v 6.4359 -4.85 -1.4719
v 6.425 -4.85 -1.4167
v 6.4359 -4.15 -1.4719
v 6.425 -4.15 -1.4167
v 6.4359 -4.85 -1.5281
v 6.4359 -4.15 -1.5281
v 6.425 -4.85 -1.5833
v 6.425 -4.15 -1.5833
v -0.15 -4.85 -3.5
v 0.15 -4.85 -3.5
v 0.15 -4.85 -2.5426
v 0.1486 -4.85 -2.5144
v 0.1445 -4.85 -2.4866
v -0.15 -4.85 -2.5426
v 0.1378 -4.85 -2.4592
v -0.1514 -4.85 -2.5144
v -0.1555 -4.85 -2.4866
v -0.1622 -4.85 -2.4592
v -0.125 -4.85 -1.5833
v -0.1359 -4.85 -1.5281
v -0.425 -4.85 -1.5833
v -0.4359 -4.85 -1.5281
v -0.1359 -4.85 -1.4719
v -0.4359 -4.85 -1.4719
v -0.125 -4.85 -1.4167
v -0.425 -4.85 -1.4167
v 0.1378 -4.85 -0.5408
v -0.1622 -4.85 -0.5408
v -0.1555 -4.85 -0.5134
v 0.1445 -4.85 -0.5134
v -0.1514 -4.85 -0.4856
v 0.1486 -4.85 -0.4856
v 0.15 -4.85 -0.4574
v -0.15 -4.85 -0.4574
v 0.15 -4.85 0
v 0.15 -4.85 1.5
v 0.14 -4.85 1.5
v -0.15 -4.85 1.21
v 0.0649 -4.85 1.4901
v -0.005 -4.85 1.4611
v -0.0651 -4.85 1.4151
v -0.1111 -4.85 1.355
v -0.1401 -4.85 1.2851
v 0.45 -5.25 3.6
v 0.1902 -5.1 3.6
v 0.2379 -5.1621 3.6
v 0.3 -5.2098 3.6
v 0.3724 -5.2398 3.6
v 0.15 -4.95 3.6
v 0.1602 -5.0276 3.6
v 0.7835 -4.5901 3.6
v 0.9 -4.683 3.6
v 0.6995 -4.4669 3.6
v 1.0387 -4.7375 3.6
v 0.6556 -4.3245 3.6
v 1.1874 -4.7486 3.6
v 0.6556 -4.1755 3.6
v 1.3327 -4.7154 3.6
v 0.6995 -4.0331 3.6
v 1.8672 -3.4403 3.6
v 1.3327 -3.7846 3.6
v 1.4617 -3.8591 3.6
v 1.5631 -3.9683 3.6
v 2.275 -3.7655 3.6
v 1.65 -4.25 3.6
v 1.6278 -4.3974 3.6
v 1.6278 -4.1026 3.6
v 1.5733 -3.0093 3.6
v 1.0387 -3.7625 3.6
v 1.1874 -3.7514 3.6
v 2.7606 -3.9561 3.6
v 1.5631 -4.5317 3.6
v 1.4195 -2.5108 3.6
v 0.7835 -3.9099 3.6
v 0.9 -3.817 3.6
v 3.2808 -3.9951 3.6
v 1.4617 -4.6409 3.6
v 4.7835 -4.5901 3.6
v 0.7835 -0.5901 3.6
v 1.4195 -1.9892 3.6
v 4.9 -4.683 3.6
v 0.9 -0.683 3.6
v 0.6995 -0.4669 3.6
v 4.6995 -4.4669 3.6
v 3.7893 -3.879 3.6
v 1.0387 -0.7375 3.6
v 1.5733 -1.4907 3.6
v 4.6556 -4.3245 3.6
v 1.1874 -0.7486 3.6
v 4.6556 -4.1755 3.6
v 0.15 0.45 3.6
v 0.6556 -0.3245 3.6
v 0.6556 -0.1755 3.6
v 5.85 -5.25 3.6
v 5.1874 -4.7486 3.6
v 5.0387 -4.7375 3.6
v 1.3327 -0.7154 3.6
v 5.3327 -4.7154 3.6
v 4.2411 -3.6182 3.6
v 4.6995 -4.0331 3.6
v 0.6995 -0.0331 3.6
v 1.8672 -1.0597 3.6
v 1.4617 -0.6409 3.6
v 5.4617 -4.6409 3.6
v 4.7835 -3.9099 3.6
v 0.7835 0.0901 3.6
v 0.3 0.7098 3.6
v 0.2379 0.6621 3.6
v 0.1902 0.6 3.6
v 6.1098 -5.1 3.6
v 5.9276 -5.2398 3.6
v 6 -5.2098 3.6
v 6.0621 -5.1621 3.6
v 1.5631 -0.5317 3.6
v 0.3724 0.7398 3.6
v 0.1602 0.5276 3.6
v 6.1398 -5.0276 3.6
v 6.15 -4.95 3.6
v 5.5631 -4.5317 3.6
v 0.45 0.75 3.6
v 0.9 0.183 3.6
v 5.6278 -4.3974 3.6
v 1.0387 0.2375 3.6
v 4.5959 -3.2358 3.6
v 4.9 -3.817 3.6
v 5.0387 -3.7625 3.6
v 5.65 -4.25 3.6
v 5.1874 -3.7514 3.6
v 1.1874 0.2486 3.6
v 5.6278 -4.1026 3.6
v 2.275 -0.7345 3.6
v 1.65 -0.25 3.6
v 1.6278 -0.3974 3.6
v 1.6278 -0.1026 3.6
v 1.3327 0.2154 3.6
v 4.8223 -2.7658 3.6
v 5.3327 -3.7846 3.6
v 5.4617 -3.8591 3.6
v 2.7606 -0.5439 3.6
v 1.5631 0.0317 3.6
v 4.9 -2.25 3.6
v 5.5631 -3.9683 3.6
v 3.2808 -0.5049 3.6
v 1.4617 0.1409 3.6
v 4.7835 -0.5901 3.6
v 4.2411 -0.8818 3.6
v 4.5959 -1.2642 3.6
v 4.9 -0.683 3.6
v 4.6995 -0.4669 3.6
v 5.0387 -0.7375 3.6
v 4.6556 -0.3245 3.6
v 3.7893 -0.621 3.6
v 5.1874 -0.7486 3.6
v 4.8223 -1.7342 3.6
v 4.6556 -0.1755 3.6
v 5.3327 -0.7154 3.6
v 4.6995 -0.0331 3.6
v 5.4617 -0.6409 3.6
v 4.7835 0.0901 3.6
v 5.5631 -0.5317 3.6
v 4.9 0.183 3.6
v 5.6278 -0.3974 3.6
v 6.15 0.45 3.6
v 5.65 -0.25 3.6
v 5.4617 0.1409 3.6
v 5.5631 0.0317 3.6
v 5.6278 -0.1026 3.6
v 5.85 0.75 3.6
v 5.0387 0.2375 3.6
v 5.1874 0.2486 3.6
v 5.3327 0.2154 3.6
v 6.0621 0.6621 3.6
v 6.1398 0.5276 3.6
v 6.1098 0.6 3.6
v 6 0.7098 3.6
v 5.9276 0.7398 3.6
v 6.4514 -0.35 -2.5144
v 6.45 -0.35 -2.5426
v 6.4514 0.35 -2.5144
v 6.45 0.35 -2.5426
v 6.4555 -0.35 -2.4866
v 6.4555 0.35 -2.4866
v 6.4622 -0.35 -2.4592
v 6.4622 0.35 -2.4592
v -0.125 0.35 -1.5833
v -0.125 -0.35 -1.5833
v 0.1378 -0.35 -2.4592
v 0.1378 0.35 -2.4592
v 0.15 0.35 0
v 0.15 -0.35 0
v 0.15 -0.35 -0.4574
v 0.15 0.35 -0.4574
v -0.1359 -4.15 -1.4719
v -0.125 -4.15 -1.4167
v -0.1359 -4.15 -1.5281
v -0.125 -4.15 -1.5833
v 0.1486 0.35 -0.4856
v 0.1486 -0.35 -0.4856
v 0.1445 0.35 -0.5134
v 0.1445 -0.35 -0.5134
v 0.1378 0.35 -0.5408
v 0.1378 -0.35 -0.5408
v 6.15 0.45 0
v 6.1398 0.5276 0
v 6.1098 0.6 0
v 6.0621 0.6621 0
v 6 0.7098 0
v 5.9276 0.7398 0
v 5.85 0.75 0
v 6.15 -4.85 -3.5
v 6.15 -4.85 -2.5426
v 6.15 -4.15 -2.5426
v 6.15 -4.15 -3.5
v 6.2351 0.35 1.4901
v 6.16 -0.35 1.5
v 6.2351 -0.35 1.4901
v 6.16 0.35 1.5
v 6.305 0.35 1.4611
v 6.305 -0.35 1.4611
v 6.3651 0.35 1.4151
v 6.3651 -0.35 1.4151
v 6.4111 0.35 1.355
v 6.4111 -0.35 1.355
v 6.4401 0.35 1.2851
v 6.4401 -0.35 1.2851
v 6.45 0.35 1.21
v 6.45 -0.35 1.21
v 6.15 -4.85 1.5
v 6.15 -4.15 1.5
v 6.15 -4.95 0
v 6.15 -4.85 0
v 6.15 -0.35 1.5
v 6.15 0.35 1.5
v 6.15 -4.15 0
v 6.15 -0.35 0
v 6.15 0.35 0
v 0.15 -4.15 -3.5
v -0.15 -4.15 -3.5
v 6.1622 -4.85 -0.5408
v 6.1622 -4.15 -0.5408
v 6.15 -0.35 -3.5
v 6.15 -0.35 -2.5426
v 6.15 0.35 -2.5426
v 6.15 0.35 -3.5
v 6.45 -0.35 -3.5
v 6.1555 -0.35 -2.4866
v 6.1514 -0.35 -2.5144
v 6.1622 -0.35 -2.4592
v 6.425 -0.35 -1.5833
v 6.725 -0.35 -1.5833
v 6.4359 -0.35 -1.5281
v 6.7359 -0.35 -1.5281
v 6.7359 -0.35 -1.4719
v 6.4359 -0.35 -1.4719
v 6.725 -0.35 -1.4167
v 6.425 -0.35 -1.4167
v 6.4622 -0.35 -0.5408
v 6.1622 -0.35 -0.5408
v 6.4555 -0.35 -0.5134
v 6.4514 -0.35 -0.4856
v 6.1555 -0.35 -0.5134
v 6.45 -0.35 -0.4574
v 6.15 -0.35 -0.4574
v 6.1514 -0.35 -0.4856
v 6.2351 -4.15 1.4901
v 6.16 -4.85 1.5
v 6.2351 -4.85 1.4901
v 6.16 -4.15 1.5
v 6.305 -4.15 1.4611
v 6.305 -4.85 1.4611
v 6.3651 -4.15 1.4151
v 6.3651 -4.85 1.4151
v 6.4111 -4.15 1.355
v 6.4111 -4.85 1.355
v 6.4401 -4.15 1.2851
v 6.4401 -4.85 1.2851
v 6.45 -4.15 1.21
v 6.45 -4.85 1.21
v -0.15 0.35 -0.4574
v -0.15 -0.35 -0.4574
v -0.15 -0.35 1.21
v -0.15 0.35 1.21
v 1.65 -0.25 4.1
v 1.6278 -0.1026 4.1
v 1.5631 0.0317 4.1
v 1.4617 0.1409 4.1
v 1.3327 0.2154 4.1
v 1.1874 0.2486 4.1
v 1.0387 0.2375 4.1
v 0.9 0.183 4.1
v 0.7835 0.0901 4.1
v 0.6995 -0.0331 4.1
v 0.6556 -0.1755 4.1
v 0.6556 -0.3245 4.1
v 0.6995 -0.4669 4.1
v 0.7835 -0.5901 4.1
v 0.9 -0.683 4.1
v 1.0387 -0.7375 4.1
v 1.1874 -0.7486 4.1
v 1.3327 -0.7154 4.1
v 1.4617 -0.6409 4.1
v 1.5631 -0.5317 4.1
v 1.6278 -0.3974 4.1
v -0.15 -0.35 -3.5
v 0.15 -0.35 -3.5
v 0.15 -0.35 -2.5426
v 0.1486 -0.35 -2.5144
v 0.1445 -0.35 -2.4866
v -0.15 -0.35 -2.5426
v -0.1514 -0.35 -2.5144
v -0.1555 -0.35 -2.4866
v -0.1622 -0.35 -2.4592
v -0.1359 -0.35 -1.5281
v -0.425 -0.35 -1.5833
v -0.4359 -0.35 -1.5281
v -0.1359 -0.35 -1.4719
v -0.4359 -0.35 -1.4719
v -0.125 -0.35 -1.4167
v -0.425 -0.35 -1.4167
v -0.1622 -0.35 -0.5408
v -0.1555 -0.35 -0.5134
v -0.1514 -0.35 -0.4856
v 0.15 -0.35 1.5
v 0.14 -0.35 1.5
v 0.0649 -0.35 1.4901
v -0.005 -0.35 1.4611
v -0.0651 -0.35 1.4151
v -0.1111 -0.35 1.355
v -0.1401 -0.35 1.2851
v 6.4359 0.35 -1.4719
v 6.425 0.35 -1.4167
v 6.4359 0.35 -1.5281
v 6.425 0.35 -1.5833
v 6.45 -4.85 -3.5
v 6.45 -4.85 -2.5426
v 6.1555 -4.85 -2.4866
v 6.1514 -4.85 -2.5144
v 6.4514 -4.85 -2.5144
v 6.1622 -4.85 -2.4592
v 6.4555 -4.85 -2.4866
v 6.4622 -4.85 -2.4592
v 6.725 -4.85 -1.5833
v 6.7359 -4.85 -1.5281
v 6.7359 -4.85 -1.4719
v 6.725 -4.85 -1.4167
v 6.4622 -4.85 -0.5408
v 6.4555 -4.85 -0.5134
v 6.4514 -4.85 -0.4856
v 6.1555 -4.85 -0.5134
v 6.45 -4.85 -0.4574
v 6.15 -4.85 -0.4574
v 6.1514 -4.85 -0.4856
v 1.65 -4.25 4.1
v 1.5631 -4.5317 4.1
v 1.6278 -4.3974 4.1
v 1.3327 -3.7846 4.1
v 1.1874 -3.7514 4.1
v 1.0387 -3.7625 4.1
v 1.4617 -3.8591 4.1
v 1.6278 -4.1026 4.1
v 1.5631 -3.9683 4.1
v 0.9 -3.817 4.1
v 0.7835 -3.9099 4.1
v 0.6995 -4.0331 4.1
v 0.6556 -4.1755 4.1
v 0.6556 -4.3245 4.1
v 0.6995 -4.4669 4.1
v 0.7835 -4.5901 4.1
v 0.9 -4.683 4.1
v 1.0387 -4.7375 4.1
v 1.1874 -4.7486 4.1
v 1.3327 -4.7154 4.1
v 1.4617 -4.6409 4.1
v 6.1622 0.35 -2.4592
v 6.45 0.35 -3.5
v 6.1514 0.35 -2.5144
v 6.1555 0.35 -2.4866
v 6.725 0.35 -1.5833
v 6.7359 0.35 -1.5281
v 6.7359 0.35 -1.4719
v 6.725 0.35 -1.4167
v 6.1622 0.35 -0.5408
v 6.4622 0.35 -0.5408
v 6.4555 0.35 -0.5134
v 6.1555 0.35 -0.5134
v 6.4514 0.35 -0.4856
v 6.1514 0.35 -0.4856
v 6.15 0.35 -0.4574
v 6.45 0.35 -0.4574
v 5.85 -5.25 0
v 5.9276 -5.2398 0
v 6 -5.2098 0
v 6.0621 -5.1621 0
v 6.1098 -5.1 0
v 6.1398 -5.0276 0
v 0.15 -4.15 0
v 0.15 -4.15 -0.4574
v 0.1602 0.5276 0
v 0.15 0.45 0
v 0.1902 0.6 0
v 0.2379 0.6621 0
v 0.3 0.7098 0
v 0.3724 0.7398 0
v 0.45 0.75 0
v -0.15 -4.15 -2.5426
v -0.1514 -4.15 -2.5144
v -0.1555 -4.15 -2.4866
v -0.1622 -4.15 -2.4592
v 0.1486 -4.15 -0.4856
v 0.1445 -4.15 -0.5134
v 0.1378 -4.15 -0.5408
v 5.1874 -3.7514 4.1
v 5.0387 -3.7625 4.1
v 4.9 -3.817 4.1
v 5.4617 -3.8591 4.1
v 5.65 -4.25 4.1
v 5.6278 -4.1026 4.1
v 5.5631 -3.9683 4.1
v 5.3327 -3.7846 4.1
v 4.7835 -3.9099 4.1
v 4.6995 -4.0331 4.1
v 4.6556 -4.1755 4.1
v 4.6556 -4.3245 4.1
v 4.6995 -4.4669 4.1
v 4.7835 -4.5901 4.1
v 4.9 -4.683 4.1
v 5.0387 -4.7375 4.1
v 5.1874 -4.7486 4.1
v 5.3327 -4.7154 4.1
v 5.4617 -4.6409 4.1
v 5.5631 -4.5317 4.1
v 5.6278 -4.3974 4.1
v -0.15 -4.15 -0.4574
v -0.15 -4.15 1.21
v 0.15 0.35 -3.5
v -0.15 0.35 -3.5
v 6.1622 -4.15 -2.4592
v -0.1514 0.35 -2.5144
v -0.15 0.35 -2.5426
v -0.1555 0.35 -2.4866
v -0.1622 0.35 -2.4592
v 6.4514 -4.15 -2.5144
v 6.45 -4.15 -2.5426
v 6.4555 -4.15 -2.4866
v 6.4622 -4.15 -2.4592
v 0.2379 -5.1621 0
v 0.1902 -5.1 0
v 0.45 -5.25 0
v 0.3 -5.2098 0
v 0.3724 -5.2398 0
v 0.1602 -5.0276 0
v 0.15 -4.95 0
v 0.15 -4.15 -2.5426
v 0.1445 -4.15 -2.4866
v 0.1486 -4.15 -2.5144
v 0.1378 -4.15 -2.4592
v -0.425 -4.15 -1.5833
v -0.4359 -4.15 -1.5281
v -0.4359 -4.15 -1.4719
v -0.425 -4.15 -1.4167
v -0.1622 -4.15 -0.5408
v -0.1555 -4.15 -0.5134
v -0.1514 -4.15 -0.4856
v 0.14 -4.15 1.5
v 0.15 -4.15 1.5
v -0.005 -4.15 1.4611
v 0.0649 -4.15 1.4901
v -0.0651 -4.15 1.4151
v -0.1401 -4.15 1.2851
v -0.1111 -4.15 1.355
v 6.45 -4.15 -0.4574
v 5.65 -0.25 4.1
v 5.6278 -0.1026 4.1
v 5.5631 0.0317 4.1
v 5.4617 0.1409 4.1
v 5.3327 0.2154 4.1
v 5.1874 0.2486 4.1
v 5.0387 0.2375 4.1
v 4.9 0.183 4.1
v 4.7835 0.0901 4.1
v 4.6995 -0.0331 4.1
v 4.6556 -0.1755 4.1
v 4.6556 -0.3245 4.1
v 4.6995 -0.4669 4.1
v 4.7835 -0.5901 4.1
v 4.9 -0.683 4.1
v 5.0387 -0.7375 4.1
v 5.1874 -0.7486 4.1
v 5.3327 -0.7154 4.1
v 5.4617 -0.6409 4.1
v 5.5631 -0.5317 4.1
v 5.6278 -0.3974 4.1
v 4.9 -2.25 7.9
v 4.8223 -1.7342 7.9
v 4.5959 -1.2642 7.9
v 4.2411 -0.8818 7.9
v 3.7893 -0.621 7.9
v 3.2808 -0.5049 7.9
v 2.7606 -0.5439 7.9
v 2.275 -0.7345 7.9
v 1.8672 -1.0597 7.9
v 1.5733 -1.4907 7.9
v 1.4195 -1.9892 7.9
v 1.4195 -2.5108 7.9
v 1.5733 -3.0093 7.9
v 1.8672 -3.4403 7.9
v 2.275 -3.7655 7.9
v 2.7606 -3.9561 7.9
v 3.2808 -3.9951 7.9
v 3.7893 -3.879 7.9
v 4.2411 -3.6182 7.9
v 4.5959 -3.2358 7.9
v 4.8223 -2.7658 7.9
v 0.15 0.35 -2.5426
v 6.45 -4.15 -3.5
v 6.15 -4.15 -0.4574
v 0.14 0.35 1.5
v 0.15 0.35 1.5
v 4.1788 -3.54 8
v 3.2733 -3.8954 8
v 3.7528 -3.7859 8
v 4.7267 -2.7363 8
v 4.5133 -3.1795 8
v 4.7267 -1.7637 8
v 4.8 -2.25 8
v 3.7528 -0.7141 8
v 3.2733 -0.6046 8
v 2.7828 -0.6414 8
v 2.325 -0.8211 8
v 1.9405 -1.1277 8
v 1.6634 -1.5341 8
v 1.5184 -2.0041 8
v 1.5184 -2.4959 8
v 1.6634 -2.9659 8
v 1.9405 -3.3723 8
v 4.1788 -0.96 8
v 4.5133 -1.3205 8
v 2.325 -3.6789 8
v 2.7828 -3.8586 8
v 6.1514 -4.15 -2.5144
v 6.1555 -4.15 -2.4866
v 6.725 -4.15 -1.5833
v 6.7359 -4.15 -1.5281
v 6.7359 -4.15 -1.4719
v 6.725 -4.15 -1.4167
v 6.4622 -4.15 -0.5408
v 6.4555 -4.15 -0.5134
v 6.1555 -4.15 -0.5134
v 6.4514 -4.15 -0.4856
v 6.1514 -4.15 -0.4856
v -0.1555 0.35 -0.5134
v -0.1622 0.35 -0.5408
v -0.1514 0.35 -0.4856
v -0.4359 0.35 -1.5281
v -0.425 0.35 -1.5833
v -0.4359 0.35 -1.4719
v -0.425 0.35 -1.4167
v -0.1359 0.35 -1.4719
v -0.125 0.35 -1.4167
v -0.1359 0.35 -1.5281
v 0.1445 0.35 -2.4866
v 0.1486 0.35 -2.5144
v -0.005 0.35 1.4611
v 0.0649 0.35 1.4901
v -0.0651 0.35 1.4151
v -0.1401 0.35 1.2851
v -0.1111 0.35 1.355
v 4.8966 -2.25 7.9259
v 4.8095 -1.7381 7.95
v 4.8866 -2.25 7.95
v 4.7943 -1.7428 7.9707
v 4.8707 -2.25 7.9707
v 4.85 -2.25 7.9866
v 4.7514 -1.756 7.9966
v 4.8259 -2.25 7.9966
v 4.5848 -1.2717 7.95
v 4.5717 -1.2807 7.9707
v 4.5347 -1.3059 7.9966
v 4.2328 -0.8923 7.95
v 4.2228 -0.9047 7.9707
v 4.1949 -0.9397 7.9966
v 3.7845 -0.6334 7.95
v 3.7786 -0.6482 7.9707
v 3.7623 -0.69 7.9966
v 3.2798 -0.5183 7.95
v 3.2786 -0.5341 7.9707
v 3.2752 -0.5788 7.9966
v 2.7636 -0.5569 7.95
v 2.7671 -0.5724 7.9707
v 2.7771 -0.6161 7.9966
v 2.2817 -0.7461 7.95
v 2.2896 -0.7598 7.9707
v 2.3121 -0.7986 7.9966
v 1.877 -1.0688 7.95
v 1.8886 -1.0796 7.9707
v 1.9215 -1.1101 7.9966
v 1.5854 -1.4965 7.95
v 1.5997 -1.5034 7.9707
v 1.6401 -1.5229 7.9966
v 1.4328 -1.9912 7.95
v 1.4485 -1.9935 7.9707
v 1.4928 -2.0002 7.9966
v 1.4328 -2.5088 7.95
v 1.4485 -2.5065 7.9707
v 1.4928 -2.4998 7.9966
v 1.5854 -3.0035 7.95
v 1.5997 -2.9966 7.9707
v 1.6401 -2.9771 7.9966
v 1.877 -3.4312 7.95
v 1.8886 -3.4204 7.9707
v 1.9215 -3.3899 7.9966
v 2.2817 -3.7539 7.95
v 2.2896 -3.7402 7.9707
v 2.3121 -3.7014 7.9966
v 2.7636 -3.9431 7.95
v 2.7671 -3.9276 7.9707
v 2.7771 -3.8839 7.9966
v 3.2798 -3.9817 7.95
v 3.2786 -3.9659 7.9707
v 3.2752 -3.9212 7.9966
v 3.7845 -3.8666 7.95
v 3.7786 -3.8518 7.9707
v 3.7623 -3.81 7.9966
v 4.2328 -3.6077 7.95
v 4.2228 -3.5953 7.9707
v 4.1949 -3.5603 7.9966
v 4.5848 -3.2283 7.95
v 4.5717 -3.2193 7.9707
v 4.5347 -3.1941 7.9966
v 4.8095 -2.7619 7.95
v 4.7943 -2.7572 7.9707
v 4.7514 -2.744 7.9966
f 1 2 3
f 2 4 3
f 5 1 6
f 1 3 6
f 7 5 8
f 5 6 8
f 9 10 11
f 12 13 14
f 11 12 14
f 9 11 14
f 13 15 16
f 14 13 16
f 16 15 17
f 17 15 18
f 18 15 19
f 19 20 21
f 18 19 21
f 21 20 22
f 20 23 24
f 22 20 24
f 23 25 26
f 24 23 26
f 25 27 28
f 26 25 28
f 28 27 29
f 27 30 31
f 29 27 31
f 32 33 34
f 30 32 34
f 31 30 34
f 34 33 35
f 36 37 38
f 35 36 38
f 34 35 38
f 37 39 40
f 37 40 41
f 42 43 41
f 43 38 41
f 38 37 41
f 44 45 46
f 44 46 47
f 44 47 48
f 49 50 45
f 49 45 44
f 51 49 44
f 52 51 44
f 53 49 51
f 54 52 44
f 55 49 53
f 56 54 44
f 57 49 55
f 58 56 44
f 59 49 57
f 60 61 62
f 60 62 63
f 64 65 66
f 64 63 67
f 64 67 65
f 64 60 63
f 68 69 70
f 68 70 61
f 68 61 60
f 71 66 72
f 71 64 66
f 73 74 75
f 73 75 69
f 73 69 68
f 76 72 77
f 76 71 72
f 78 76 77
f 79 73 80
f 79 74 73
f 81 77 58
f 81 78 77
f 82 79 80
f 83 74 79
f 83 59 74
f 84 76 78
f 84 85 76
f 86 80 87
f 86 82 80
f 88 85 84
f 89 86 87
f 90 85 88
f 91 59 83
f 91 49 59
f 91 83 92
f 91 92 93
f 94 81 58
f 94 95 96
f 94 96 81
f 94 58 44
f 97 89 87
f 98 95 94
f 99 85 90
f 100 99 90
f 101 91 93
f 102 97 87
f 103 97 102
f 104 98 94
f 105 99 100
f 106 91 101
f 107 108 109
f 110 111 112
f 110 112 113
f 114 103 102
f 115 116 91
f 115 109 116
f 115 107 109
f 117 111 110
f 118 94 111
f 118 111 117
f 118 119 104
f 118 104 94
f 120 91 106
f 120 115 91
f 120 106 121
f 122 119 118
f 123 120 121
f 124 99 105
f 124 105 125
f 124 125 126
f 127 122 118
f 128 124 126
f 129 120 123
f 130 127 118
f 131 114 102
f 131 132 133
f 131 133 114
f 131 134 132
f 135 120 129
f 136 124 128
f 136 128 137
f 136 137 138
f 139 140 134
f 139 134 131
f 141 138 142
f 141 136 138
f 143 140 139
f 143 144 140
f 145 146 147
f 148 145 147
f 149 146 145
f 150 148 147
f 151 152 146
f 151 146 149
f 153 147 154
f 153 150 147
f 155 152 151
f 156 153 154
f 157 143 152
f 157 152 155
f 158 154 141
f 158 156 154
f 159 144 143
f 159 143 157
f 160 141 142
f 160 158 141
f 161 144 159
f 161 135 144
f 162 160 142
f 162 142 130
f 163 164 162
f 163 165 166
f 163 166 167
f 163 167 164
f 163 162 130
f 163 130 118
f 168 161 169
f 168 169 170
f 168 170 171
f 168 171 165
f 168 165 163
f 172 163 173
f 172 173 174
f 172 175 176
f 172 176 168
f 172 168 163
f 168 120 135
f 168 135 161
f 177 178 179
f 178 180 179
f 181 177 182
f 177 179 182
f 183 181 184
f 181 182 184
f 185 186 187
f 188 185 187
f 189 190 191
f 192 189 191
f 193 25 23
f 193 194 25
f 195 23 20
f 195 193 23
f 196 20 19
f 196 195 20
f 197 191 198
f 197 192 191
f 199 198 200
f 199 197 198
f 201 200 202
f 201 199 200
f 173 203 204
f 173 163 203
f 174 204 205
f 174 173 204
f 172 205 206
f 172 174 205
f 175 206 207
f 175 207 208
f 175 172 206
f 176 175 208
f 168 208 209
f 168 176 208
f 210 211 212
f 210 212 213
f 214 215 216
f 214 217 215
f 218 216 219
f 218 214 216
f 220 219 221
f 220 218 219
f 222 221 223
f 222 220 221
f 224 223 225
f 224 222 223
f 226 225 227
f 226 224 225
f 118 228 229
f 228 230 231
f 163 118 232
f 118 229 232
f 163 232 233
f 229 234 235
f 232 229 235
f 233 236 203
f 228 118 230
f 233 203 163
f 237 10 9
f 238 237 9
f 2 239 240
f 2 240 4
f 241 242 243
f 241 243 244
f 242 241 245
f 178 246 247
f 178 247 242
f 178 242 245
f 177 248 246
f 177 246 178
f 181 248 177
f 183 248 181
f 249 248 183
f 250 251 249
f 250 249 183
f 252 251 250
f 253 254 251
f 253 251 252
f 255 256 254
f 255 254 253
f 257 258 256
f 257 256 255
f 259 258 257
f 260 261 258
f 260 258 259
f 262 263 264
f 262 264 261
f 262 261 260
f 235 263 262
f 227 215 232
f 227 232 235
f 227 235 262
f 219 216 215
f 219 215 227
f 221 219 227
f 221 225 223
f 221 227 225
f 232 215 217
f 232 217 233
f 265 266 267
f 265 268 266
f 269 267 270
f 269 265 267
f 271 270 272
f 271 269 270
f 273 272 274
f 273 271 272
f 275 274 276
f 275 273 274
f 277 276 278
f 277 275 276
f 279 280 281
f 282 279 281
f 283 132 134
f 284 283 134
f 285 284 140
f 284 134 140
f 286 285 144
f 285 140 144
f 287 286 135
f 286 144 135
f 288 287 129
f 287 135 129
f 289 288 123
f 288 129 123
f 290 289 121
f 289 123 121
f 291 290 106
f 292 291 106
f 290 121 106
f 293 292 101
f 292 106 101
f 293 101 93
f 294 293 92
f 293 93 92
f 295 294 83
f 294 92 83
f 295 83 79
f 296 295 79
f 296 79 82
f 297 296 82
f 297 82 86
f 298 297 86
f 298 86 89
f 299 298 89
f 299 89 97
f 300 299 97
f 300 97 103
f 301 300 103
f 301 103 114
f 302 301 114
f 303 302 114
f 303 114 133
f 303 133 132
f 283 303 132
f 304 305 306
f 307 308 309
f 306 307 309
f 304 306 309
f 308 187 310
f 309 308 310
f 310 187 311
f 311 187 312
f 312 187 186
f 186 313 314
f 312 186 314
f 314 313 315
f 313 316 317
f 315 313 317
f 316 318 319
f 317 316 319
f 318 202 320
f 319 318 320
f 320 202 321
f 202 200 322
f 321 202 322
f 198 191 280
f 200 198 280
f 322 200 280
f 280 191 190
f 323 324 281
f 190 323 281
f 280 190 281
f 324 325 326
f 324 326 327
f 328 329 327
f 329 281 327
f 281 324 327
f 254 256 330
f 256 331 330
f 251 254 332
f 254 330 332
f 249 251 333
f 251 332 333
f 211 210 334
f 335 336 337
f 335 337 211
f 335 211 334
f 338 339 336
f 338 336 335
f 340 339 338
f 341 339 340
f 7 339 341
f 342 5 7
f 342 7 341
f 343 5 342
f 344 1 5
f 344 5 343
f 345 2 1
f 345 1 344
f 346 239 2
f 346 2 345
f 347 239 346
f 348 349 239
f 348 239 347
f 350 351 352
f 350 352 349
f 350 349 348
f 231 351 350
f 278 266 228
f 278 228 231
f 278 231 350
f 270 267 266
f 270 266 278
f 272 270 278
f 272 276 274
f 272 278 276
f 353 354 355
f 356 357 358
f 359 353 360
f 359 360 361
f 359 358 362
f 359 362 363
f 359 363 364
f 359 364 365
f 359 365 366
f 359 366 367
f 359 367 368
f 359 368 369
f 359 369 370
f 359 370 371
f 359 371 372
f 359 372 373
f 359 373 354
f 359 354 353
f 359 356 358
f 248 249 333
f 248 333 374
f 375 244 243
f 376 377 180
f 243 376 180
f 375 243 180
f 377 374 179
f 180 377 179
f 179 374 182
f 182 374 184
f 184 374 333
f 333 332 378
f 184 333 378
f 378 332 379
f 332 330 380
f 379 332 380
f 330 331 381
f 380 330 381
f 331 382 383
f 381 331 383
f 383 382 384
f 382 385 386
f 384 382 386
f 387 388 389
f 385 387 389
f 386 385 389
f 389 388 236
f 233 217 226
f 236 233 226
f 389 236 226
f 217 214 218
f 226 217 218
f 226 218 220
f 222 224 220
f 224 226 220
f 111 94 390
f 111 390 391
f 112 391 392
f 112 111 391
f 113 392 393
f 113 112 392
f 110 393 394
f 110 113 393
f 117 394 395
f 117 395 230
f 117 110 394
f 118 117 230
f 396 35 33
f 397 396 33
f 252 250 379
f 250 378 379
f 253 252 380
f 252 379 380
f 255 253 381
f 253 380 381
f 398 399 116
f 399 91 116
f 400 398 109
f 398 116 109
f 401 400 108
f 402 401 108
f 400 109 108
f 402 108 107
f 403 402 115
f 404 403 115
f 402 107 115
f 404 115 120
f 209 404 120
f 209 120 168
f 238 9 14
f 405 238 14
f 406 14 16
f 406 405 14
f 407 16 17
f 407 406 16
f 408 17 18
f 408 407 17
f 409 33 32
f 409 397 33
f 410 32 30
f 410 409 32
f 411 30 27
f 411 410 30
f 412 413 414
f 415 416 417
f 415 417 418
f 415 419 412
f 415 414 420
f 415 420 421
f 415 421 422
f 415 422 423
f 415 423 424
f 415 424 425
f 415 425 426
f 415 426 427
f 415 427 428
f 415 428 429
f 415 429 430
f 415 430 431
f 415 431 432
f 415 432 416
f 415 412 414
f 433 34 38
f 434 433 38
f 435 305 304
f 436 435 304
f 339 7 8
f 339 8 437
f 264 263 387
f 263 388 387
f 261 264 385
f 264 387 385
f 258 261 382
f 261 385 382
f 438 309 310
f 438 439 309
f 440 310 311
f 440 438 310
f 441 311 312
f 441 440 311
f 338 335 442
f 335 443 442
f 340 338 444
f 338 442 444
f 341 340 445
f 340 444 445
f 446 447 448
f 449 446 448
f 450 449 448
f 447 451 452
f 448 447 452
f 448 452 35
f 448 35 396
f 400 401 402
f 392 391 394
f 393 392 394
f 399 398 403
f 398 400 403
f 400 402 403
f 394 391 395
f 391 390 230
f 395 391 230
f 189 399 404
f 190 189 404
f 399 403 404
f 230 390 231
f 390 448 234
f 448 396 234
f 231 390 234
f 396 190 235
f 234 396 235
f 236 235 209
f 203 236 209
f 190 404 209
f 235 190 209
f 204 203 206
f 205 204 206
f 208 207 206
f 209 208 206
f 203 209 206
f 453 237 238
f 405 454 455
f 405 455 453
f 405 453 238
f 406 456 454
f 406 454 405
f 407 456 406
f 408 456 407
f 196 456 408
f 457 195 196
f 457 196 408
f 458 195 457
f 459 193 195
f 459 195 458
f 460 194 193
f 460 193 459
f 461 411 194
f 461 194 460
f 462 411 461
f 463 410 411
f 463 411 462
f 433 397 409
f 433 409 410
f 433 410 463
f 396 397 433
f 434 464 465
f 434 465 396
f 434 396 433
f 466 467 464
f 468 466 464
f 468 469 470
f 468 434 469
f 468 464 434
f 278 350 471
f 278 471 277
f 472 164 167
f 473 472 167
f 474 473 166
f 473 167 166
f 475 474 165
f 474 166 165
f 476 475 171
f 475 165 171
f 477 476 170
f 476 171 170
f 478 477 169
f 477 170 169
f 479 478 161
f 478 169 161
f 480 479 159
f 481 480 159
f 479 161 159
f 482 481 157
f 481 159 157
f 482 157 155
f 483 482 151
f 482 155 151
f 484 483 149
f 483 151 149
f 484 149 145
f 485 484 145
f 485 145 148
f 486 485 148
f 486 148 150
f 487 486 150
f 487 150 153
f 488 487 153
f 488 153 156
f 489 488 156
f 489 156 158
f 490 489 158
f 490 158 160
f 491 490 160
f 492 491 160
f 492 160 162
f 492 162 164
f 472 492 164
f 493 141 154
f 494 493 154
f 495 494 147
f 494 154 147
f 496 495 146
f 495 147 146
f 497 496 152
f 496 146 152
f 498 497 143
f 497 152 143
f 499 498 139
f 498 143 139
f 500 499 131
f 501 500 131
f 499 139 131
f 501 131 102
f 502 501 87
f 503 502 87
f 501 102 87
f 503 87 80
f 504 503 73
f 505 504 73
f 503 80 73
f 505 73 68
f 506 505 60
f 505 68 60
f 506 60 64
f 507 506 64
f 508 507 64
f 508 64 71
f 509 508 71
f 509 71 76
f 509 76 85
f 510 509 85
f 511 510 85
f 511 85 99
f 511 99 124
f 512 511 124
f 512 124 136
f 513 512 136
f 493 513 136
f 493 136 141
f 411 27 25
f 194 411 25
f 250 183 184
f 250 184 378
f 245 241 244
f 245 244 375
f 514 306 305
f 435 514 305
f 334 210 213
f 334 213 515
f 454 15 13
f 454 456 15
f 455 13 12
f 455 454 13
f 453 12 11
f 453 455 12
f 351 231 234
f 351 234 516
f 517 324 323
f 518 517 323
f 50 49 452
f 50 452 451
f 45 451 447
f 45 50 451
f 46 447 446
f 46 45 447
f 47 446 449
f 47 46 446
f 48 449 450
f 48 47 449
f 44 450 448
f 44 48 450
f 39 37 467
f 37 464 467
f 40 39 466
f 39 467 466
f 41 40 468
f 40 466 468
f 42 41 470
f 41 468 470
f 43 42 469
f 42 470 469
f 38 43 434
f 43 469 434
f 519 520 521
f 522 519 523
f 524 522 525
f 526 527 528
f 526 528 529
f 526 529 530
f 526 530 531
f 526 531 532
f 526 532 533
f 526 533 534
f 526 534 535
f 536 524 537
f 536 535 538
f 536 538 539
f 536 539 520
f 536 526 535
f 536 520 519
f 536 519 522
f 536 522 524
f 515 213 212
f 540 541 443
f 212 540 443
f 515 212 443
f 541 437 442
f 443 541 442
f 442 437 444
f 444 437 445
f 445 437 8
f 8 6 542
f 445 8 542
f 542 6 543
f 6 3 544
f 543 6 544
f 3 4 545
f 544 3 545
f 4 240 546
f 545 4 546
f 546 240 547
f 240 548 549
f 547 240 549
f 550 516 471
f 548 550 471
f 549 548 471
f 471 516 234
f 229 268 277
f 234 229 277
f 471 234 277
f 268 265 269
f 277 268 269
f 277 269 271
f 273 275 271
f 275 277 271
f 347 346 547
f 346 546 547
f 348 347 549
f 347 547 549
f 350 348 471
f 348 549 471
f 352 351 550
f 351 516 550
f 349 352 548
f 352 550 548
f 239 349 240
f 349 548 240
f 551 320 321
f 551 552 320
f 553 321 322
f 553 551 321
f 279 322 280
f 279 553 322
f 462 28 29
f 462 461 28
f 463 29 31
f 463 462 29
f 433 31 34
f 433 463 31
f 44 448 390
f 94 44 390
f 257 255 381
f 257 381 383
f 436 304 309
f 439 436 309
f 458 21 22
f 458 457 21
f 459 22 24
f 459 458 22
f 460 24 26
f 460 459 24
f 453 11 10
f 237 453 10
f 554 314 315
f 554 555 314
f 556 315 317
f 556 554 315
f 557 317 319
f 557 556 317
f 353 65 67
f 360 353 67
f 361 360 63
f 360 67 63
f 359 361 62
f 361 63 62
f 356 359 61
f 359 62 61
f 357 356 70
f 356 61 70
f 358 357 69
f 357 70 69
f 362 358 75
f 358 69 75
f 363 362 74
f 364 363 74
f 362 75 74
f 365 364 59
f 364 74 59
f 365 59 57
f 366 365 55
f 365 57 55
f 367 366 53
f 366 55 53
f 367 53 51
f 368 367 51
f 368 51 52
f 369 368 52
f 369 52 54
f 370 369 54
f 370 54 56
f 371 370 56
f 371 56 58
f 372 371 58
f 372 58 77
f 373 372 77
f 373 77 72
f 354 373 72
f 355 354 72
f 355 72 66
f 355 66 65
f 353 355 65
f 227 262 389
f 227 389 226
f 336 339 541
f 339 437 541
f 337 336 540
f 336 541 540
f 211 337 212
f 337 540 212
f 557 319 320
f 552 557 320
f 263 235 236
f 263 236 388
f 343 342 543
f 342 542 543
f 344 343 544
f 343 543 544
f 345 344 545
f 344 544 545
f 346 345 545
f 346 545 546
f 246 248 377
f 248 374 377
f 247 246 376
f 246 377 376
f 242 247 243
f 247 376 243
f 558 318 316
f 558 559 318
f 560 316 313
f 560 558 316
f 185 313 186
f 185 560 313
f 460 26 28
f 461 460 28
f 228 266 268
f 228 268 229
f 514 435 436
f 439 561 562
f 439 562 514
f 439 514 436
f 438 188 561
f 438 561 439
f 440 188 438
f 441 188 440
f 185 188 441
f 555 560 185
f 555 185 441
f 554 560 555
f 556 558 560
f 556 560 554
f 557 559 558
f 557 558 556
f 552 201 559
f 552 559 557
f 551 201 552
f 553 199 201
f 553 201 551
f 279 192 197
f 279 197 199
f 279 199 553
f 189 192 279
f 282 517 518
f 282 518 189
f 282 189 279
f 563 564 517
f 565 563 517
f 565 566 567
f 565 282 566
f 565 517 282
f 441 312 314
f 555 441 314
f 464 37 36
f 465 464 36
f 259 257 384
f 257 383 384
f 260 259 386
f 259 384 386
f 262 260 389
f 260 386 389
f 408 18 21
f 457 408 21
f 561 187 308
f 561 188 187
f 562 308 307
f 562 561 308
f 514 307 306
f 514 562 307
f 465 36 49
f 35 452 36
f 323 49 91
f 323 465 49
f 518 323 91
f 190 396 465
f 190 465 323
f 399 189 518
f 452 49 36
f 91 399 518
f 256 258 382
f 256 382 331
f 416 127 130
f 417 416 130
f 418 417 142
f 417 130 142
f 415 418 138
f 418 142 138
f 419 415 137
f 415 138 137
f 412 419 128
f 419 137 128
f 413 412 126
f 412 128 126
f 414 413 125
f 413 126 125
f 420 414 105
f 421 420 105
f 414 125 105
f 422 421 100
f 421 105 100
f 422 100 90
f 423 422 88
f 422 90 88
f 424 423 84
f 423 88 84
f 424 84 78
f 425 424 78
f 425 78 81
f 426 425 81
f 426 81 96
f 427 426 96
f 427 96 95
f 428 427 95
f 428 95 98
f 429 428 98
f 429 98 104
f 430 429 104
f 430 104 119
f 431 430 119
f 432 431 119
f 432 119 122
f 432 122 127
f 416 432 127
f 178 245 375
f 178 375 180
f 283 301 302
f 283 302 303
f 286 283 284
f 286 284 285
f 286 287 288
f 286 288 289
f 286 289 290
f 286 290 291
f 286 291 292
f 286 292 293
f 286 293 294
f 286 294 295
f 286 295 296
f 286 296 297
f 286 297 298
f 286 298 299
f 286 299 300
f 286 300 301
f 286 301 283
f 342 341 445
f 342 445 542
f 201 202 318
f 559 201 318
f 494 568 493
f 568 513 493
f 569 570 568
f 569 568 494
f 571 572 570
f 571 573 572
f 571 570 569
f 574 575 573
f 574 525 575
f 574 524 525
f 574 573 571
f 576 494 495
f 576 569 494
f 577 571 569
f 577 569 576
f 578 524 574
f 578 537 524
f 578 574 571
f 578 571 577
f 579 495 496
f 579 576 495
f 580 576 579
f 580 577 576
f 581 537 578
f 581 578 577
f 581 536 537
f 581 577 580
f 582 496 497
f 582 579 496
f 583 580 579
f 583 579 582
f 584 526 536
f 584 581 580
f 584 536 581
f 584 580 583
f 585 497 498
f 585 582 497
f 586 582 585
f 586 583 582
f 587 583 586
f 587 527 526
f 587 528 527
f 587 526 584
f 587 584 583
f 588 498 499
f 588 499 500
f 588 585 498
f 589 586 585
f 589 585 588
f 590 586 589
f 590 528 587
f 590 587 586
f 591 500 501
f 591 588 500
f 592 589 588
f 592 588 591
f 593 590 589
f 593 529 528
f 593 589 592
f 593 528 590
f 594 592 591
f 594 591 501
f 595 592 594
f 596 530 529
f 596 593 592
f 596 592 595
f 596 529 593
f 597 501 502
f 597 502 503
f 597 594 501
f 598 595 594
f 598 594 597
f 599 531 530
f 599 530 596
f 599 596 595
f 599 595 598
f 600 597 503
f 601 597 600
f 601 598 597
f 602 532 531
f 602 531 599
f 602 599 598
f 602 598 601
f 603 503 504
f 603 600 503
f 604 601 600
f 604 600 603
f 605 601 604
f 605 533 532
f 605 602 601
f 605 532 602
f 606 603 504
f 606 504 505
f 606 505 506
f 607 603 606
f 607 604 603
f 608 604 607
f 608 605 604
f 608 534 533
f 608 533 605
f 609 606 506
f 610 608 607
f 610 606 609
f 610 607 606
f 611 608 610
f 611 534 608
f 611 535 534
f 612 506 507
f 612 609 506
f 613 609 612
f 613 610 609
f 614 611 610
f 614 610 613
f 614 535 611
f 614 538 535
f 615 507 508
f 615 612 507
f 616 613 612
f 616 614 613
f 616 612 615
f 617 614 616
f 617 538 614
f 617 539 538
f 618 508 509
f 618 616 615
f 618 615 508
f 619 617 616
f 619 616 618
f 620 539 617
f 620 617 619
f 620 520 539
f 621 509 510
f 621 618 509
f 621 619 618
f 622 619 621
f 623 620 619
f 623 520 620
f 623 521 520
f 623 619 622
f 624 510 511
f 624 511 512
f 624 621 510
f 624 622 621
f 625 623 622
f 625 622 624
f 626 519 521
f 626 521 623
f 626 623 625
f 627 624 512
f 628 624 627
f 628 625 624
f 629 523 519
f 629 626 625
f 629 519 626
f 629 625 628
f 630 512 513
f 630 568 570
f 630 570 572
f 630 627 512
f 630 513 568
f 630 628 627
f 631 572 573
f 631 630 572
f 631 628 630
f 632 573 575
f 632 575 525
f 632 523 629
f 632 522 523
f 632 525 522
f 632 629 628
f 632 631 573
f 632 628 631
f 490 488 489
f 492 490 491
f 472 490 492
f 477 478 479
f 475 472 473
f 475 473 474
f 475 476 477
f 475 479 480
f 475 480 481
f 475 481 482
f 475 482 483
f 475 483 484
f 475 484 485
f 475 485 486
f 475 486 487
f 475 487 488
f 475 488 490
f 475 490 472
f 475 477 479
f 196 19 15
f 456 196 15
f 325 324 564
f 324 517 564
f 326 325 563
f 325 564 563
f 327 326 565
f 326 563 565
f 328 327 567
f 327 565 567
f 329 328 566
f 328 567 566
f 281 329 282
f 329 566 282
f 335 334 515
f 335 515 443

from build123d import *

# Parameters (mm, degrees)
SKETCH001_W  = 6
SKETCH001_H  = 6
PAD001_DEPTH = 0.1
FILLET001_R  = 0.3
PAD008_DEPTH = 0.7
FILLET003_R  = 0.29
PAD009_DEPTH = 0.7
FILLET004_R  = 0.29
PAD010_DEPTH = 0.7
FILLET005_R  = 0.29
SKETCH_W     = 6
SKETCH_H     = 6
PAD_DEPTH    = 3.5
FILLET_R     = 0.3
SKETCH004_R  = 0.5
PAD003_DEPTH = 0.6
SKETCH003_R  = 0.5
PAD004_DEPTH = 0.6
SKETCH005_R  = 0.5
PAD002_DEPTH = 0.6
SKETCH002_R  = 0.5
PAD005_DEPTH = 0.6
SKETCH006_R  = 1.75
PAD006_DEPTH = 4.5
FILLET006_R  = 0.1
PAD007_DEPTH = 0.7
FILLET002_R  = 0.29


with BuildPart() as fillet001:
    # Sketch001 → Pad001 (new body)
    with BuildSketch(Plane.XY.offset(3.5)):
        with Locations((3.15, -2.25)):
            Rectangle(SKETCH001_W, SKETCH001_H)
    extrude(amount=PAD001_DEPTH)

    # Fillet001
    fillet001_edges = [fillet001.edges().sort_by_distance(p)[0] for p in [
        (6.15, -5.25, 3.55),
        (0.15, -5.25, 3.55),
        (6.15, 0.75, 3.55),
        (0.15, 0.75, 3.55),
    ]]
    fillet(fillet001_edges, radius=FILLET001_R)


with BuildPart() as fillet003:
    # Sketch008 → Pad008 (new body)
    with BuildSketch(Plane.XZ.offset(0.35)):
        Polygon((-0.15, 1.5), (0.15, 1.5), (0.15, -0.5), (-0.15, -1.5), (0.15, -2.5), (0.15, -3.5), (-0.15, -3.5), (-0.15, -2.5), (-0.45, -1.5), (-0.15, -0.5), align=None)
    extrude(amount=-PAD008_DEPTH)

    # Fillet003
    fillet003_edges = [fillet003.edges().sort_by_distance(p)[0] for p in [
        (-0.15, 0, -2.5),
        (-0.15, 0, -0.5),
        (-0.45, 0, -1.5),
        (-0.15, 0, 1.5),
        (0.15, 0, -0.5),
        (-0.15, 0, -1.5),
        (0.15, 0, -2.5),
    ]]
    fillet(fillet003_edges, radius=FILLET003_R)


with BuildPart() as fillet004:
    # Sketch009 → Pad009 (new body)
    with BuildSketch(Plane.XZ.offset(4.85)):
        Polygon((6.45, 1.5), (6.15, 1.5), (6.15, -0.5), (6.45, -1.5), (6.15, -2.5), (6.15, -3.5), (6.45, -3.5), (6.45, -2.5), (6.75, -1.5), (6.45, -0.5), align=None)
    extrude(amount=-PAD009_DEPTH)

    # Fillet004
    fillet004_edges = [fillet004.edges().sort_by_distance(p)[0] for p in [
        (6.45, -4.5, -2.5),
        (6.45, -4.5, -0.5),
        (6.75, -4.5, -1.5),
        (6.45, -4.5, 1.5),
        (6.15, -4.5, -0.5),
        (6.45, -4.5, -1.5),
        (6.15, -4.5, -2.5),
    ]]
    fillet(fillet004_edges, radius=FILLET004_R)


with BuildPart() as fillet005:
    # Sketch010 → Pad010 (new body)
    with BuildSketch(Plane.XZ.offset(0.35)):
        Polygon((6.45, 1.5), (6.15, 1.5), (6.15, -0.5), (6.45, -1.5), (6.15, -2.5), (6.15, -3.5), (6.45, -3.5), (6.45, -2.5), (6.75, -1.5), (6.45, -0.5), align=None)
    extrude(amount=-PAD010_DEPTH)

    # Fillet005
    fillet005_edges = [fillet005.edges().sort_by_distance(p)[0] for p in [
        (6.45, 0, -2.5),
        (6.45, 0, -0.5),
        (6.75, 0, -1.5),
        (6.45, 0, 1.5),
        (6.15, 0, -0.5),
        (6.45, 0, -1.5),
        (6.15, 0, -2.5),
    ]]
    fillet(fillet005_edges, radius=FILLET005_R)


with BuildPart() as fillet_body:
    # Sketch → Pad (new body)
    with BuildSketch(Plane.XY):
        with Locations((3.15, -2.25)):
            Rectangle(SKETCH_W, SKETCH_H)
    extrude(amount=PAD_DEPTH)

    # Fillet
    fillet_edges = [fillet_body.edges().sort_by_distance(p)[0] for p in [
        (6.15, 0.75, 1.75),
        (6.15, -5.25, 1.75),
        (0.15, -5.25, 1.75),
        (0.15, 0.75, 1.75),
    ]]
    fillet(fillet_edges, radius=FILLET_R)


with BuildPart() as pad003:
    # Pad003 base: copy of Fillet body
    add(fillet_body.part)

    # Sketch004 → Pad003 (new body)
    with BuildSketch(Plane.XY.offset(3.5)):
        with Locations((5.15, -0.25)):
            Circle(SKETCH004_R)
    extrude(amount=PAD003_DEPTH)


with BuildPart() as pad004:
    # Pad004 base: copy of Fillet body
    add(fillet_body.part)

    # Sketch003 → Pad004 (new body)
    with BuildSketch(Plane.XY.offset(3.5)):
        with Locations((5.15, -4.25)):
            Circle(SKETCH003_R)
    extrude(amount=PAD004_DEPTH)


with BuildPart() as pad002:
    # Pad002 base: copy of Fillet body
    add(fillet_body.part)

    # Sketch005 → Pad002 (new body)
    with BuildSketch(Plane.XY.offset(3.5)):
        with Locations((1.15, -0.25)):
            Circle(SKETCH005_R)
    extrude(amount=PAD002_DEPTH)


with BuildPart() as pad005:
    # Pad005 base: copy of Fillet body
    add(fillet_body.part)

    # Sketch002 → Pad005 (new body)
    with BuildSketch(Plane.XY.offset(3.5)):
        with Locations((1.15, -4.25)):
            Circle(SKETCH002_R)
    extrude(amount=PAD005_DEPTH)


with BuildPart() as fillet006:
    # Pad006 base: copy of Fillet body
    add(fillet_body.part)

    # Sketch006 → Pad006 (new body)
    with BuildSketch(Plane.XY.offset(3.5)):
        with Locations((3.15, -2.25)):
            Circle(SKETCH006_R)
    extrude(amount=PAD006_DEPTH)

    # Fillet006
    fillet006_edges = [fillet006.edges().sort_by_distance(p)[0] for p in [
        (1.4, -2.25, 8),
    ]]
    fillet(fillet006_edges, radius=FILLET006_R)


with BuildPart() as sw_push_6mm_h8mm:
    # Sketch007 → Pad007 (new body)
    with BuildSketch(Plane.XZ.offset(4.85)):
        Polygon((-0.15, 1.5), (0.15, 1.5), (0.15, -0.5), (-0.15, -1.5), (0.15, -2.5), (0.15, -3.5), (-0.15, -3.5), (-0.15, -2.5), (-0.45, -1.5), (-0.15, -0.5), align=None)
    extrude(amount=-PAD007_DEPTH)

    # Fillet002
    fillet002_edges = [sw_push_6mm_h8mm.edges().sort_by_distance(p)[0] for p in [
        (-0.15, -4.5, -2.5),
        (-0.15, -4.5, -0.5),
        (-0.45, -4.5, -1.5),
        (-0.15, -4.5, 1.5),
        (0.15, -4.5, -0.5),
        (-0.15, -4.5, -1.5),
        (0.15, -4.5, -2.5),
    ]]
    fillet(fillet002_edges, radius=FILLET002_R)

    # Fillet002_mp_cp: union Fillet001, Fillet003, Fillet004, Fillet005, Pad003, Pad004, Pad002, Pad005, Fillet006
    add(fillet001.part)
    add(fillet003.part)
    add(fillet004.part)
    add(fillet005.part)
    add(pad003.part)
    add(pad004.part)
    add(pad002.part)
    add(pad005.part)
    add(fillet006.part)


solid = sw_push_6mm_h8mm.part
